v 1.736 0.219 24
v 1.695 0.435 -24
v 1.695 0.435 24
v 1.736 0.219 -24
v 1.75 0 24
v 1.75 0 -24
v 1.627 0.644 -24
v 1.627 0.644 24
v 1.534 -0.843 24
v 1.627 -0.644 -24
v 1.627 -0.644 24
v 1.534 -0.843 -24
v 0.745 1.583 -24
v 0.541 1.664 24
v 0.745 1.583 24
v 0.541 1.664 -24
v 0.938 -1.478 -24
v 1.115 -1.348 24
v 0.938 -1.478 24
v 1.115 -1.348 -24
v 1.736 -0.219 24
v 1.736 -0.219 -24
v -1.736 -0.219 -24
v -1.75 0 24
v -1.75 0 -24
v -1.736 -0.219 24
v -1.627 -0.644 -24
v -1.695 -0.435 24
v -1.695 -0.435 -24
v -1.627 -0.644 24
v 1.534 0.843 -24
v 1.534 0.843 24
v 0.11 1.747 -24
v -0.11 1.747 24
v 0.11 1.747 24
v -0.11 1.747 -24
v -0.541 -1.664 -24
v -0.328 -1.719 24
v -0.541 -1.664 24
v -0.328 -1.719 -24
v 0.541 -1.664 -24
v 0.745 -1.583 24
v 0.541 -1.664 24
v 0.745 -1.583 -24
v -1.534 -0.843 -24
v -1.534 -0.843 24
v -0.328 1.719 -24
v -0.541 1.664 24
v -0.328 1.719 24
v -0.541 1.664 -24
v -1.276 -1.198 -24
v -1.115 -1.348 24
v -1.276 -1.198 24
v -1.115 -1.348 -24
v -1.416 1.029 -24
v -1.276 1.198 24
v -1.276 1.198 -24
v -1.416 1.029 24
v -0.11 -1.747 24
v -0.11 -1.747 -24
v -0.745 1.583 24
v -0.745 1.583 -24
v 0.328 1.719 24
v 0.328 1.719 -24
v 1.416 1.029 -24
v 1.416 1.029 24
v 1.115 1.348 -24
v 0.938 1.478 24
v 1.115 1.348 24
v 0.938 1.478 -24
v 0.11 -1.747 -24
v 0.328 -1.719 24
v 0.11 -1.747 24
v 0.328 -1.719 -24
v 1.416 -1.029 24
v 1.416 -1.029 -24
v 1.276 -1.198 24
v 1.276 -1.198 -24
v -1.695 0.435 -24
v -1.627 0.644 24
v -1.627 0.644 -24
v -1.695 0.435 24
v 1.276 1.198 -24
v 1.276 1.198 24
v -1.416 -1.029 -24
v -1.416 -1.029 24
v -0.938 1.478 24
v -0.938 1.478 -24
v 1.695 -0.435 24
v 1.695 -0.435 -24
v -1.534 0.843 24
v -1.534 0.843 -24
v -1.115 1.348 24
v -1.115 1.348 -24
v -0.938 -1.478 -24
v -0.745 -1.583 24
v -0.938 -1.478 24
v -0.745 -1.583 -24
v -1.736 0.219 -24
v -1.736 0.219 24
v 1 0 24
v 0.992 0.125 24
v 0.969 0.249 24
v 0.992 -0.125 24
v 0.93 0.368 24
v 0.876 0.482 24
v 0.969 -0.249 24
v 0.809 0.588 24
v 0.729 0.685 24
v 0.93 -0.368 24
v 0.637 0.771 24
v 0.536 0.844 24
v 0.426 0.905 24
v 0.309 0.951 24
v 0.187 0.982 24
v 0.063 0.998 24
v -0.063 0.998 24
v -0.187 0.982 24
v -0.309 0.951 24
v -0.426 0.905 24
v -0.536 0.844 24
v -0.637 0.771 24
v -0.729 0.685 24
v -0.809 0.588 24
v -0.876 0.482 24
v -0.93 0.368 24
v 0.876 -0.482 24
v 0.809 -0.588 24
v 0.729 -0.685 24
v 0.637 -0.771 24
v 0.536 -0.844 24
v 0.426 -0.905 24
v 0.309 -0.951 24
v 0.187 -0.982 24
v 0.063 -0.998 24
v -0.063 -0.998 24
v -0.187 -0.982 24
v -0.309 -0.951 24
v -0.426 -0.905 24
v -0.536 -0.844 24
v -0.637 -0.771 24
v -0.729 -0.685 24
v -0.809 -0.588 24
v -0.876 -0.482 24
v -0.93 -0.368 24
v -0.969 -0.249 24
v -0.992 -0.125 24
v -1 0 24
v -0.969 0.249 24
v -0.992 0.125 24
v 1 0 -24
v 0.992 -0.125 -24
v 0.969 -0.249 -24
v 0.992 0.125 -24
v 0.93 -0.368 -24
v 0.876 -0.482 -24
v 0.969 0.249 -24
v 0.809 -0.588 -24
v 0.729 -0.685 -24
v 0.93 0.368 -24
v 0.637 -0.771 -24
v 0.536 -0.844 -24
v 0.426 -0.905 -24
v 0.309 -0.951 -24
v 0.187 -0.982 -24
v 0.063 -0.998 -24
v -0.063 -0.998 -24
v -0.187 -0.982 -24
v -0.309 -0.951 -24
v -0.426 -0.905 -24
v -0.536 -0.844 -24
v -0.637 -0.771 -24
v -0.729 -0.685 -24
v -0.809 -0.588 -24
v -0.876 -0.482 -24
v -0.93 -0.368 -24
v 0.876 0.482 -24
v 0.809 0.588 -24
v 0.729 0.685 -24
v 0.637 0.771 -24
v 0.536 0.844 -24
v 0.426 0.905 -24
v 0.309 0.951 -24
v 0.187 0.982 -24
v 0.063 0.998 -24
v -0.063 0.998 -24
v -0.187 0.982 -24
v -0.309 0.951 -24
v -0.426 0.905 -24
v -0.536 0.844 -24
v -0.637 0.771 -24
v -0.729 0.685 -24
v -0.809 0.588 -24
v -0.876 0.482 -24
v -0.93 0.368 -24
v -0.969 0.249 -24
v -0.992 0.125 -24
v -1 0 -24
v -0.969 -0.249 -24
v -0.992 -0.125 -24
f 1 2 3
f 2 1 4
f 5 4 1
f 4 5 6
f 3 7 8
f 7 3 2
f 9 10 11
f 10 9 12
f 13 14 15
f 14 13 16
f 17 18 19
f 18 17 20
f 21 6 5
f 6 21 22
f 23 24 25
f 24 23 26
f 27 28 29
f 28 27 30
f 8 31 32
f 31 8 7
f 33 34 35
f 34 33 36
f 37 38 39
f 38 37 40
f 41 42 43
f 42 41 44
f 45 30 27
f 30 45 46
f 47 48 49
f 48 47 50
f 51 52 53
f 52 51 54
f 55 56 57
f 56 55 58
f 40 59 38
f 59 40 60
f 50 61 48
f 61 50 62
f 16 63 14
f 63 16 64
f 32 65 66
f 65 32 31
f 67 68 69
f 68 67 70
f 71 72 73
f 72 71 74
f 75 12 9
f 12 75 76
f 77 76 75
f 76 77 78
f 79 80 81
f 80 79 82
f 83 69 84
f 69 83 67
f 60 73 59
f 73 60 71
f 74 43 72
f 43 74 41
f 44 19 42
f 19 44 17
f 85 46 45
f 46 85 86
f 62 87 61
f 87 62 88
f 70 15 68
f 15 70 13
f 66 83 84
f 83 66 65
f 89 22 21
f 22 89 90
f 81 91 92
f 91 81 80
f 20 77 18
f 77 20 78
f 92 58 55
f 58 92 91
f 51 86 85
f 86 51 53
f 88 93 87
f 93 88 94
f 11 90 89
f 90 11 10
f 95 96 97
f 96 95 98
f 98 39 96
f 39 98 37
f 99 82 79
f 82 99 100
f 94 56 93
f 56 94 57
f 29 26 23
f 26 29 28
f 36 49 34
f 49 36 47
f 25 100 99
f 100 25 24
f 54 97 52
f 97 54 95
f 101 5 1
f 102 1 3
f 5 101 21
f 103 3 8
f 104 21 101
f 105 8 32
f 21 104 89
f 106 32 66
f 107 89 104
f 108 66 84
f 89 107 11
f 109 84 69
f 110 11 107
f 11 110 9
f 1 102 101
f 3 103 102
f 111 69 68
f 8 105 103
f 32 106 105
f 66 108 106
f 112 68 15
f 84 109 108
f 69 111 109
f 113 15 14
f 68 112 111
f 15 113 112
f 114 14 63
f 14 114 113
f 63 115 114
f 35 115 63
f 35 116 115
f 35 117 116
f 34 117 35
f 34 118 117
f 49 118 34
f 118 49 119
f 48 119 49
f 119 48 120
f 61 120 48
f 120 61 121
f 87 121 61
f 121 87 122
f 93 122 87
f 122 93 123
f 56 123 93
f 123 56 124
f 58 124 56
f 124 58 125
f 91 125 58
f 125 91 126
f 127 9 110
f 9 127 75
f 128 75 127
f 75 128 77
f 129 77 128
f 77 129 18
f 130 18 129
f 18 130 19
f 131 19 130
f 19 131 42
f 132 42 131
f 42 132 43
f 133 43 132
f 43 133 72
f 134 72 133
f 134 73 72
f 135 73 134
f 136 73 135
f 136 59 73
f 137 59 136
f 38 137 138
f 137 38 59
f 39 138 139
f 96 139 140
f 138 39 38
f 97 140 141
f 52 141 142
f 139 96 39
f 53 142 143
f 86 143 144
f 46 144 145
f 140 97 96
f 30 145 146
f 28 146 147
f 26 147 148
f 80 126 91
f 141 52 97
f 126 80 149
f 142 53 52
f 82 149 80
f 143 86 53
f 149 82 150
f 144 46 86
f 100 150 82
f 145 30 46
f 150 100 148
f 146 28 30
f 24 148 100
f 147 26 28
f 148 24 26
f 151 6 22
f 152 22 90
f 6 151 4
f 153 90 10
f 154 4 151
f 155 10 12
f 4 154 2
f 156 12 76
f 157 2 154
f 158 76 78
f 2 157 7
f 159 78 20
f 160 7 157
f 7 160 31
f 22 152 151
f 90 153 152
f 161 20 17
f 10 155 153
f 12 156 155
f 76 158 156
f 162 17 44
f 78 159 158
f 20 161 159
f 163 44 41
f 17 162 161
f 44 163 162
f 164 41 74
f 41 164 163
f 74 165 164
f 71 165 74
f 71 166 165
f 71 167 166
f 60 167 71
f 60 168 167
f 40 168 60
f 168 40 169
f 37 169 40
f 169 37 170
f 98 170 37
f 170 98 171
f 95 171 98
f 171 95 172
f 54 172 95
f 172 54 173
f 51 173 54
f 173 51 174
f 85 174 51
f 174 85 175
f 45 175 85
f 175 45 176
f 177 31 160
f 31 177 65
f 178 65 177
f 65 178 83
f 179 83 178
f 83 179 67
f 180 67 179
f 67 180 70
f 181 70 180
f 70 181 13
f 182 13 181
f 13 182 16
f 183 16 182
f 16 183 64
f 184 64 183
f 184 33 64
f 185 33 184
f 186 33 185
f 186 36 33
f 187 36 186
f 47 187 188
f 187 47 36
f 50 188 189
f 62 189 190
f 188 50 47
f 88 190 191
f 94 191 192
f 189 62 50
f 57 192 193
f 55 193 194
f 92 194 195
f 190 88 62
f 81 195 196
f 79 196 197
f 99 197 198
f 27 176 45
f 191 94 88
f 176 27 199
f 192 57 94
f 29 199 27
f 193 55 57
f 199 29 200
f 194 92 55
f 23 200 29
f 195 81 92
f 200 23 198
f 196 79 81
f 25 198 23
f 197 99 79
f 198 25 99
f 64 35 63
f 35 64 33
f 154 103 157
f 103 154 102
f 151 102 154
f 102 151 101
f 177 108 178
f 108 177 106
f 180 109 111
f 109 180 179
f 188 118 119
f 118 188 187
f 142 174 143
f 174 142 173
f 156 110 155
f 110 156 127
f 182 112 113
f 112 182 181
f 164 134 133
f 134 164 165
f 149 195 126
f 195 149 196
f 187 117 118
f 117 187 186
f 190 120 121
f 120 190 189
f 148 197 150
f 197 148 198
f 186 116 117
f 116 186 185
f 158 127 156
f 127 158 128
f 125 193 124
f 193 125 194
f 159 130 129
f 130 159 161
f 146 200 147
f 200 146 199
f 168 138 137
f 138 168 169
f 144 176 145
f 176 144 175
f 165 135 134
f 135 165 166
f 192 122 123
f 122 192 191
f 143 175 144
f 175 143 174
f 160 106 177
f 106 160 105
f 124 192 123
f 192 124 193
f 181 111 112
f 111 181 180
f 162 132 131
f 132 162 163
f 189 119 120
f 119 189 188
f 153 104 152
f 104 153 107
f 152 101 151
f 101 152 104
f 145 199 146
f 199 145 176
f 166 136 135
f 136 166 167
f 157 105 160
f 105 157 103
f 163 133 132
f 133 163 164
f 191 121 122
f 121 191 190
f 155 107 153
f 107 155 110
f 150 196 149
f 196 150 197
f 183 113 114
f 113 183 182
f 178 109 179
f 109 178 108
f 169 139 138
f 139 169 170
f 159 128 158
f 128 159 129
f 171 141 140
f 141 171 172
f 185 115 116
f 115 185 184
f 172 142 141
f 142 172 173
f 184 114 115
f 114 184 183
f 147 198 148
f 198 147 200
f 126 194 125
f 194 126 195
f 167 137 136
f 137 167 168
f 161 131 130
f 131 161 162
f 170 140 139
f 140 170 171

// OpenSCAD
$fn = 50;


difference() {
	union() {
		translate(v = [0, 0, -24.0000000000]) {
			cylinder(h = 48, r = 1.7500000000);
		}
	}
	union() {
		translate(v = [0, 0, -100.0000000000]) {
			cylinder(h = 200, r = 1.0000000000);
		}
	}
}
